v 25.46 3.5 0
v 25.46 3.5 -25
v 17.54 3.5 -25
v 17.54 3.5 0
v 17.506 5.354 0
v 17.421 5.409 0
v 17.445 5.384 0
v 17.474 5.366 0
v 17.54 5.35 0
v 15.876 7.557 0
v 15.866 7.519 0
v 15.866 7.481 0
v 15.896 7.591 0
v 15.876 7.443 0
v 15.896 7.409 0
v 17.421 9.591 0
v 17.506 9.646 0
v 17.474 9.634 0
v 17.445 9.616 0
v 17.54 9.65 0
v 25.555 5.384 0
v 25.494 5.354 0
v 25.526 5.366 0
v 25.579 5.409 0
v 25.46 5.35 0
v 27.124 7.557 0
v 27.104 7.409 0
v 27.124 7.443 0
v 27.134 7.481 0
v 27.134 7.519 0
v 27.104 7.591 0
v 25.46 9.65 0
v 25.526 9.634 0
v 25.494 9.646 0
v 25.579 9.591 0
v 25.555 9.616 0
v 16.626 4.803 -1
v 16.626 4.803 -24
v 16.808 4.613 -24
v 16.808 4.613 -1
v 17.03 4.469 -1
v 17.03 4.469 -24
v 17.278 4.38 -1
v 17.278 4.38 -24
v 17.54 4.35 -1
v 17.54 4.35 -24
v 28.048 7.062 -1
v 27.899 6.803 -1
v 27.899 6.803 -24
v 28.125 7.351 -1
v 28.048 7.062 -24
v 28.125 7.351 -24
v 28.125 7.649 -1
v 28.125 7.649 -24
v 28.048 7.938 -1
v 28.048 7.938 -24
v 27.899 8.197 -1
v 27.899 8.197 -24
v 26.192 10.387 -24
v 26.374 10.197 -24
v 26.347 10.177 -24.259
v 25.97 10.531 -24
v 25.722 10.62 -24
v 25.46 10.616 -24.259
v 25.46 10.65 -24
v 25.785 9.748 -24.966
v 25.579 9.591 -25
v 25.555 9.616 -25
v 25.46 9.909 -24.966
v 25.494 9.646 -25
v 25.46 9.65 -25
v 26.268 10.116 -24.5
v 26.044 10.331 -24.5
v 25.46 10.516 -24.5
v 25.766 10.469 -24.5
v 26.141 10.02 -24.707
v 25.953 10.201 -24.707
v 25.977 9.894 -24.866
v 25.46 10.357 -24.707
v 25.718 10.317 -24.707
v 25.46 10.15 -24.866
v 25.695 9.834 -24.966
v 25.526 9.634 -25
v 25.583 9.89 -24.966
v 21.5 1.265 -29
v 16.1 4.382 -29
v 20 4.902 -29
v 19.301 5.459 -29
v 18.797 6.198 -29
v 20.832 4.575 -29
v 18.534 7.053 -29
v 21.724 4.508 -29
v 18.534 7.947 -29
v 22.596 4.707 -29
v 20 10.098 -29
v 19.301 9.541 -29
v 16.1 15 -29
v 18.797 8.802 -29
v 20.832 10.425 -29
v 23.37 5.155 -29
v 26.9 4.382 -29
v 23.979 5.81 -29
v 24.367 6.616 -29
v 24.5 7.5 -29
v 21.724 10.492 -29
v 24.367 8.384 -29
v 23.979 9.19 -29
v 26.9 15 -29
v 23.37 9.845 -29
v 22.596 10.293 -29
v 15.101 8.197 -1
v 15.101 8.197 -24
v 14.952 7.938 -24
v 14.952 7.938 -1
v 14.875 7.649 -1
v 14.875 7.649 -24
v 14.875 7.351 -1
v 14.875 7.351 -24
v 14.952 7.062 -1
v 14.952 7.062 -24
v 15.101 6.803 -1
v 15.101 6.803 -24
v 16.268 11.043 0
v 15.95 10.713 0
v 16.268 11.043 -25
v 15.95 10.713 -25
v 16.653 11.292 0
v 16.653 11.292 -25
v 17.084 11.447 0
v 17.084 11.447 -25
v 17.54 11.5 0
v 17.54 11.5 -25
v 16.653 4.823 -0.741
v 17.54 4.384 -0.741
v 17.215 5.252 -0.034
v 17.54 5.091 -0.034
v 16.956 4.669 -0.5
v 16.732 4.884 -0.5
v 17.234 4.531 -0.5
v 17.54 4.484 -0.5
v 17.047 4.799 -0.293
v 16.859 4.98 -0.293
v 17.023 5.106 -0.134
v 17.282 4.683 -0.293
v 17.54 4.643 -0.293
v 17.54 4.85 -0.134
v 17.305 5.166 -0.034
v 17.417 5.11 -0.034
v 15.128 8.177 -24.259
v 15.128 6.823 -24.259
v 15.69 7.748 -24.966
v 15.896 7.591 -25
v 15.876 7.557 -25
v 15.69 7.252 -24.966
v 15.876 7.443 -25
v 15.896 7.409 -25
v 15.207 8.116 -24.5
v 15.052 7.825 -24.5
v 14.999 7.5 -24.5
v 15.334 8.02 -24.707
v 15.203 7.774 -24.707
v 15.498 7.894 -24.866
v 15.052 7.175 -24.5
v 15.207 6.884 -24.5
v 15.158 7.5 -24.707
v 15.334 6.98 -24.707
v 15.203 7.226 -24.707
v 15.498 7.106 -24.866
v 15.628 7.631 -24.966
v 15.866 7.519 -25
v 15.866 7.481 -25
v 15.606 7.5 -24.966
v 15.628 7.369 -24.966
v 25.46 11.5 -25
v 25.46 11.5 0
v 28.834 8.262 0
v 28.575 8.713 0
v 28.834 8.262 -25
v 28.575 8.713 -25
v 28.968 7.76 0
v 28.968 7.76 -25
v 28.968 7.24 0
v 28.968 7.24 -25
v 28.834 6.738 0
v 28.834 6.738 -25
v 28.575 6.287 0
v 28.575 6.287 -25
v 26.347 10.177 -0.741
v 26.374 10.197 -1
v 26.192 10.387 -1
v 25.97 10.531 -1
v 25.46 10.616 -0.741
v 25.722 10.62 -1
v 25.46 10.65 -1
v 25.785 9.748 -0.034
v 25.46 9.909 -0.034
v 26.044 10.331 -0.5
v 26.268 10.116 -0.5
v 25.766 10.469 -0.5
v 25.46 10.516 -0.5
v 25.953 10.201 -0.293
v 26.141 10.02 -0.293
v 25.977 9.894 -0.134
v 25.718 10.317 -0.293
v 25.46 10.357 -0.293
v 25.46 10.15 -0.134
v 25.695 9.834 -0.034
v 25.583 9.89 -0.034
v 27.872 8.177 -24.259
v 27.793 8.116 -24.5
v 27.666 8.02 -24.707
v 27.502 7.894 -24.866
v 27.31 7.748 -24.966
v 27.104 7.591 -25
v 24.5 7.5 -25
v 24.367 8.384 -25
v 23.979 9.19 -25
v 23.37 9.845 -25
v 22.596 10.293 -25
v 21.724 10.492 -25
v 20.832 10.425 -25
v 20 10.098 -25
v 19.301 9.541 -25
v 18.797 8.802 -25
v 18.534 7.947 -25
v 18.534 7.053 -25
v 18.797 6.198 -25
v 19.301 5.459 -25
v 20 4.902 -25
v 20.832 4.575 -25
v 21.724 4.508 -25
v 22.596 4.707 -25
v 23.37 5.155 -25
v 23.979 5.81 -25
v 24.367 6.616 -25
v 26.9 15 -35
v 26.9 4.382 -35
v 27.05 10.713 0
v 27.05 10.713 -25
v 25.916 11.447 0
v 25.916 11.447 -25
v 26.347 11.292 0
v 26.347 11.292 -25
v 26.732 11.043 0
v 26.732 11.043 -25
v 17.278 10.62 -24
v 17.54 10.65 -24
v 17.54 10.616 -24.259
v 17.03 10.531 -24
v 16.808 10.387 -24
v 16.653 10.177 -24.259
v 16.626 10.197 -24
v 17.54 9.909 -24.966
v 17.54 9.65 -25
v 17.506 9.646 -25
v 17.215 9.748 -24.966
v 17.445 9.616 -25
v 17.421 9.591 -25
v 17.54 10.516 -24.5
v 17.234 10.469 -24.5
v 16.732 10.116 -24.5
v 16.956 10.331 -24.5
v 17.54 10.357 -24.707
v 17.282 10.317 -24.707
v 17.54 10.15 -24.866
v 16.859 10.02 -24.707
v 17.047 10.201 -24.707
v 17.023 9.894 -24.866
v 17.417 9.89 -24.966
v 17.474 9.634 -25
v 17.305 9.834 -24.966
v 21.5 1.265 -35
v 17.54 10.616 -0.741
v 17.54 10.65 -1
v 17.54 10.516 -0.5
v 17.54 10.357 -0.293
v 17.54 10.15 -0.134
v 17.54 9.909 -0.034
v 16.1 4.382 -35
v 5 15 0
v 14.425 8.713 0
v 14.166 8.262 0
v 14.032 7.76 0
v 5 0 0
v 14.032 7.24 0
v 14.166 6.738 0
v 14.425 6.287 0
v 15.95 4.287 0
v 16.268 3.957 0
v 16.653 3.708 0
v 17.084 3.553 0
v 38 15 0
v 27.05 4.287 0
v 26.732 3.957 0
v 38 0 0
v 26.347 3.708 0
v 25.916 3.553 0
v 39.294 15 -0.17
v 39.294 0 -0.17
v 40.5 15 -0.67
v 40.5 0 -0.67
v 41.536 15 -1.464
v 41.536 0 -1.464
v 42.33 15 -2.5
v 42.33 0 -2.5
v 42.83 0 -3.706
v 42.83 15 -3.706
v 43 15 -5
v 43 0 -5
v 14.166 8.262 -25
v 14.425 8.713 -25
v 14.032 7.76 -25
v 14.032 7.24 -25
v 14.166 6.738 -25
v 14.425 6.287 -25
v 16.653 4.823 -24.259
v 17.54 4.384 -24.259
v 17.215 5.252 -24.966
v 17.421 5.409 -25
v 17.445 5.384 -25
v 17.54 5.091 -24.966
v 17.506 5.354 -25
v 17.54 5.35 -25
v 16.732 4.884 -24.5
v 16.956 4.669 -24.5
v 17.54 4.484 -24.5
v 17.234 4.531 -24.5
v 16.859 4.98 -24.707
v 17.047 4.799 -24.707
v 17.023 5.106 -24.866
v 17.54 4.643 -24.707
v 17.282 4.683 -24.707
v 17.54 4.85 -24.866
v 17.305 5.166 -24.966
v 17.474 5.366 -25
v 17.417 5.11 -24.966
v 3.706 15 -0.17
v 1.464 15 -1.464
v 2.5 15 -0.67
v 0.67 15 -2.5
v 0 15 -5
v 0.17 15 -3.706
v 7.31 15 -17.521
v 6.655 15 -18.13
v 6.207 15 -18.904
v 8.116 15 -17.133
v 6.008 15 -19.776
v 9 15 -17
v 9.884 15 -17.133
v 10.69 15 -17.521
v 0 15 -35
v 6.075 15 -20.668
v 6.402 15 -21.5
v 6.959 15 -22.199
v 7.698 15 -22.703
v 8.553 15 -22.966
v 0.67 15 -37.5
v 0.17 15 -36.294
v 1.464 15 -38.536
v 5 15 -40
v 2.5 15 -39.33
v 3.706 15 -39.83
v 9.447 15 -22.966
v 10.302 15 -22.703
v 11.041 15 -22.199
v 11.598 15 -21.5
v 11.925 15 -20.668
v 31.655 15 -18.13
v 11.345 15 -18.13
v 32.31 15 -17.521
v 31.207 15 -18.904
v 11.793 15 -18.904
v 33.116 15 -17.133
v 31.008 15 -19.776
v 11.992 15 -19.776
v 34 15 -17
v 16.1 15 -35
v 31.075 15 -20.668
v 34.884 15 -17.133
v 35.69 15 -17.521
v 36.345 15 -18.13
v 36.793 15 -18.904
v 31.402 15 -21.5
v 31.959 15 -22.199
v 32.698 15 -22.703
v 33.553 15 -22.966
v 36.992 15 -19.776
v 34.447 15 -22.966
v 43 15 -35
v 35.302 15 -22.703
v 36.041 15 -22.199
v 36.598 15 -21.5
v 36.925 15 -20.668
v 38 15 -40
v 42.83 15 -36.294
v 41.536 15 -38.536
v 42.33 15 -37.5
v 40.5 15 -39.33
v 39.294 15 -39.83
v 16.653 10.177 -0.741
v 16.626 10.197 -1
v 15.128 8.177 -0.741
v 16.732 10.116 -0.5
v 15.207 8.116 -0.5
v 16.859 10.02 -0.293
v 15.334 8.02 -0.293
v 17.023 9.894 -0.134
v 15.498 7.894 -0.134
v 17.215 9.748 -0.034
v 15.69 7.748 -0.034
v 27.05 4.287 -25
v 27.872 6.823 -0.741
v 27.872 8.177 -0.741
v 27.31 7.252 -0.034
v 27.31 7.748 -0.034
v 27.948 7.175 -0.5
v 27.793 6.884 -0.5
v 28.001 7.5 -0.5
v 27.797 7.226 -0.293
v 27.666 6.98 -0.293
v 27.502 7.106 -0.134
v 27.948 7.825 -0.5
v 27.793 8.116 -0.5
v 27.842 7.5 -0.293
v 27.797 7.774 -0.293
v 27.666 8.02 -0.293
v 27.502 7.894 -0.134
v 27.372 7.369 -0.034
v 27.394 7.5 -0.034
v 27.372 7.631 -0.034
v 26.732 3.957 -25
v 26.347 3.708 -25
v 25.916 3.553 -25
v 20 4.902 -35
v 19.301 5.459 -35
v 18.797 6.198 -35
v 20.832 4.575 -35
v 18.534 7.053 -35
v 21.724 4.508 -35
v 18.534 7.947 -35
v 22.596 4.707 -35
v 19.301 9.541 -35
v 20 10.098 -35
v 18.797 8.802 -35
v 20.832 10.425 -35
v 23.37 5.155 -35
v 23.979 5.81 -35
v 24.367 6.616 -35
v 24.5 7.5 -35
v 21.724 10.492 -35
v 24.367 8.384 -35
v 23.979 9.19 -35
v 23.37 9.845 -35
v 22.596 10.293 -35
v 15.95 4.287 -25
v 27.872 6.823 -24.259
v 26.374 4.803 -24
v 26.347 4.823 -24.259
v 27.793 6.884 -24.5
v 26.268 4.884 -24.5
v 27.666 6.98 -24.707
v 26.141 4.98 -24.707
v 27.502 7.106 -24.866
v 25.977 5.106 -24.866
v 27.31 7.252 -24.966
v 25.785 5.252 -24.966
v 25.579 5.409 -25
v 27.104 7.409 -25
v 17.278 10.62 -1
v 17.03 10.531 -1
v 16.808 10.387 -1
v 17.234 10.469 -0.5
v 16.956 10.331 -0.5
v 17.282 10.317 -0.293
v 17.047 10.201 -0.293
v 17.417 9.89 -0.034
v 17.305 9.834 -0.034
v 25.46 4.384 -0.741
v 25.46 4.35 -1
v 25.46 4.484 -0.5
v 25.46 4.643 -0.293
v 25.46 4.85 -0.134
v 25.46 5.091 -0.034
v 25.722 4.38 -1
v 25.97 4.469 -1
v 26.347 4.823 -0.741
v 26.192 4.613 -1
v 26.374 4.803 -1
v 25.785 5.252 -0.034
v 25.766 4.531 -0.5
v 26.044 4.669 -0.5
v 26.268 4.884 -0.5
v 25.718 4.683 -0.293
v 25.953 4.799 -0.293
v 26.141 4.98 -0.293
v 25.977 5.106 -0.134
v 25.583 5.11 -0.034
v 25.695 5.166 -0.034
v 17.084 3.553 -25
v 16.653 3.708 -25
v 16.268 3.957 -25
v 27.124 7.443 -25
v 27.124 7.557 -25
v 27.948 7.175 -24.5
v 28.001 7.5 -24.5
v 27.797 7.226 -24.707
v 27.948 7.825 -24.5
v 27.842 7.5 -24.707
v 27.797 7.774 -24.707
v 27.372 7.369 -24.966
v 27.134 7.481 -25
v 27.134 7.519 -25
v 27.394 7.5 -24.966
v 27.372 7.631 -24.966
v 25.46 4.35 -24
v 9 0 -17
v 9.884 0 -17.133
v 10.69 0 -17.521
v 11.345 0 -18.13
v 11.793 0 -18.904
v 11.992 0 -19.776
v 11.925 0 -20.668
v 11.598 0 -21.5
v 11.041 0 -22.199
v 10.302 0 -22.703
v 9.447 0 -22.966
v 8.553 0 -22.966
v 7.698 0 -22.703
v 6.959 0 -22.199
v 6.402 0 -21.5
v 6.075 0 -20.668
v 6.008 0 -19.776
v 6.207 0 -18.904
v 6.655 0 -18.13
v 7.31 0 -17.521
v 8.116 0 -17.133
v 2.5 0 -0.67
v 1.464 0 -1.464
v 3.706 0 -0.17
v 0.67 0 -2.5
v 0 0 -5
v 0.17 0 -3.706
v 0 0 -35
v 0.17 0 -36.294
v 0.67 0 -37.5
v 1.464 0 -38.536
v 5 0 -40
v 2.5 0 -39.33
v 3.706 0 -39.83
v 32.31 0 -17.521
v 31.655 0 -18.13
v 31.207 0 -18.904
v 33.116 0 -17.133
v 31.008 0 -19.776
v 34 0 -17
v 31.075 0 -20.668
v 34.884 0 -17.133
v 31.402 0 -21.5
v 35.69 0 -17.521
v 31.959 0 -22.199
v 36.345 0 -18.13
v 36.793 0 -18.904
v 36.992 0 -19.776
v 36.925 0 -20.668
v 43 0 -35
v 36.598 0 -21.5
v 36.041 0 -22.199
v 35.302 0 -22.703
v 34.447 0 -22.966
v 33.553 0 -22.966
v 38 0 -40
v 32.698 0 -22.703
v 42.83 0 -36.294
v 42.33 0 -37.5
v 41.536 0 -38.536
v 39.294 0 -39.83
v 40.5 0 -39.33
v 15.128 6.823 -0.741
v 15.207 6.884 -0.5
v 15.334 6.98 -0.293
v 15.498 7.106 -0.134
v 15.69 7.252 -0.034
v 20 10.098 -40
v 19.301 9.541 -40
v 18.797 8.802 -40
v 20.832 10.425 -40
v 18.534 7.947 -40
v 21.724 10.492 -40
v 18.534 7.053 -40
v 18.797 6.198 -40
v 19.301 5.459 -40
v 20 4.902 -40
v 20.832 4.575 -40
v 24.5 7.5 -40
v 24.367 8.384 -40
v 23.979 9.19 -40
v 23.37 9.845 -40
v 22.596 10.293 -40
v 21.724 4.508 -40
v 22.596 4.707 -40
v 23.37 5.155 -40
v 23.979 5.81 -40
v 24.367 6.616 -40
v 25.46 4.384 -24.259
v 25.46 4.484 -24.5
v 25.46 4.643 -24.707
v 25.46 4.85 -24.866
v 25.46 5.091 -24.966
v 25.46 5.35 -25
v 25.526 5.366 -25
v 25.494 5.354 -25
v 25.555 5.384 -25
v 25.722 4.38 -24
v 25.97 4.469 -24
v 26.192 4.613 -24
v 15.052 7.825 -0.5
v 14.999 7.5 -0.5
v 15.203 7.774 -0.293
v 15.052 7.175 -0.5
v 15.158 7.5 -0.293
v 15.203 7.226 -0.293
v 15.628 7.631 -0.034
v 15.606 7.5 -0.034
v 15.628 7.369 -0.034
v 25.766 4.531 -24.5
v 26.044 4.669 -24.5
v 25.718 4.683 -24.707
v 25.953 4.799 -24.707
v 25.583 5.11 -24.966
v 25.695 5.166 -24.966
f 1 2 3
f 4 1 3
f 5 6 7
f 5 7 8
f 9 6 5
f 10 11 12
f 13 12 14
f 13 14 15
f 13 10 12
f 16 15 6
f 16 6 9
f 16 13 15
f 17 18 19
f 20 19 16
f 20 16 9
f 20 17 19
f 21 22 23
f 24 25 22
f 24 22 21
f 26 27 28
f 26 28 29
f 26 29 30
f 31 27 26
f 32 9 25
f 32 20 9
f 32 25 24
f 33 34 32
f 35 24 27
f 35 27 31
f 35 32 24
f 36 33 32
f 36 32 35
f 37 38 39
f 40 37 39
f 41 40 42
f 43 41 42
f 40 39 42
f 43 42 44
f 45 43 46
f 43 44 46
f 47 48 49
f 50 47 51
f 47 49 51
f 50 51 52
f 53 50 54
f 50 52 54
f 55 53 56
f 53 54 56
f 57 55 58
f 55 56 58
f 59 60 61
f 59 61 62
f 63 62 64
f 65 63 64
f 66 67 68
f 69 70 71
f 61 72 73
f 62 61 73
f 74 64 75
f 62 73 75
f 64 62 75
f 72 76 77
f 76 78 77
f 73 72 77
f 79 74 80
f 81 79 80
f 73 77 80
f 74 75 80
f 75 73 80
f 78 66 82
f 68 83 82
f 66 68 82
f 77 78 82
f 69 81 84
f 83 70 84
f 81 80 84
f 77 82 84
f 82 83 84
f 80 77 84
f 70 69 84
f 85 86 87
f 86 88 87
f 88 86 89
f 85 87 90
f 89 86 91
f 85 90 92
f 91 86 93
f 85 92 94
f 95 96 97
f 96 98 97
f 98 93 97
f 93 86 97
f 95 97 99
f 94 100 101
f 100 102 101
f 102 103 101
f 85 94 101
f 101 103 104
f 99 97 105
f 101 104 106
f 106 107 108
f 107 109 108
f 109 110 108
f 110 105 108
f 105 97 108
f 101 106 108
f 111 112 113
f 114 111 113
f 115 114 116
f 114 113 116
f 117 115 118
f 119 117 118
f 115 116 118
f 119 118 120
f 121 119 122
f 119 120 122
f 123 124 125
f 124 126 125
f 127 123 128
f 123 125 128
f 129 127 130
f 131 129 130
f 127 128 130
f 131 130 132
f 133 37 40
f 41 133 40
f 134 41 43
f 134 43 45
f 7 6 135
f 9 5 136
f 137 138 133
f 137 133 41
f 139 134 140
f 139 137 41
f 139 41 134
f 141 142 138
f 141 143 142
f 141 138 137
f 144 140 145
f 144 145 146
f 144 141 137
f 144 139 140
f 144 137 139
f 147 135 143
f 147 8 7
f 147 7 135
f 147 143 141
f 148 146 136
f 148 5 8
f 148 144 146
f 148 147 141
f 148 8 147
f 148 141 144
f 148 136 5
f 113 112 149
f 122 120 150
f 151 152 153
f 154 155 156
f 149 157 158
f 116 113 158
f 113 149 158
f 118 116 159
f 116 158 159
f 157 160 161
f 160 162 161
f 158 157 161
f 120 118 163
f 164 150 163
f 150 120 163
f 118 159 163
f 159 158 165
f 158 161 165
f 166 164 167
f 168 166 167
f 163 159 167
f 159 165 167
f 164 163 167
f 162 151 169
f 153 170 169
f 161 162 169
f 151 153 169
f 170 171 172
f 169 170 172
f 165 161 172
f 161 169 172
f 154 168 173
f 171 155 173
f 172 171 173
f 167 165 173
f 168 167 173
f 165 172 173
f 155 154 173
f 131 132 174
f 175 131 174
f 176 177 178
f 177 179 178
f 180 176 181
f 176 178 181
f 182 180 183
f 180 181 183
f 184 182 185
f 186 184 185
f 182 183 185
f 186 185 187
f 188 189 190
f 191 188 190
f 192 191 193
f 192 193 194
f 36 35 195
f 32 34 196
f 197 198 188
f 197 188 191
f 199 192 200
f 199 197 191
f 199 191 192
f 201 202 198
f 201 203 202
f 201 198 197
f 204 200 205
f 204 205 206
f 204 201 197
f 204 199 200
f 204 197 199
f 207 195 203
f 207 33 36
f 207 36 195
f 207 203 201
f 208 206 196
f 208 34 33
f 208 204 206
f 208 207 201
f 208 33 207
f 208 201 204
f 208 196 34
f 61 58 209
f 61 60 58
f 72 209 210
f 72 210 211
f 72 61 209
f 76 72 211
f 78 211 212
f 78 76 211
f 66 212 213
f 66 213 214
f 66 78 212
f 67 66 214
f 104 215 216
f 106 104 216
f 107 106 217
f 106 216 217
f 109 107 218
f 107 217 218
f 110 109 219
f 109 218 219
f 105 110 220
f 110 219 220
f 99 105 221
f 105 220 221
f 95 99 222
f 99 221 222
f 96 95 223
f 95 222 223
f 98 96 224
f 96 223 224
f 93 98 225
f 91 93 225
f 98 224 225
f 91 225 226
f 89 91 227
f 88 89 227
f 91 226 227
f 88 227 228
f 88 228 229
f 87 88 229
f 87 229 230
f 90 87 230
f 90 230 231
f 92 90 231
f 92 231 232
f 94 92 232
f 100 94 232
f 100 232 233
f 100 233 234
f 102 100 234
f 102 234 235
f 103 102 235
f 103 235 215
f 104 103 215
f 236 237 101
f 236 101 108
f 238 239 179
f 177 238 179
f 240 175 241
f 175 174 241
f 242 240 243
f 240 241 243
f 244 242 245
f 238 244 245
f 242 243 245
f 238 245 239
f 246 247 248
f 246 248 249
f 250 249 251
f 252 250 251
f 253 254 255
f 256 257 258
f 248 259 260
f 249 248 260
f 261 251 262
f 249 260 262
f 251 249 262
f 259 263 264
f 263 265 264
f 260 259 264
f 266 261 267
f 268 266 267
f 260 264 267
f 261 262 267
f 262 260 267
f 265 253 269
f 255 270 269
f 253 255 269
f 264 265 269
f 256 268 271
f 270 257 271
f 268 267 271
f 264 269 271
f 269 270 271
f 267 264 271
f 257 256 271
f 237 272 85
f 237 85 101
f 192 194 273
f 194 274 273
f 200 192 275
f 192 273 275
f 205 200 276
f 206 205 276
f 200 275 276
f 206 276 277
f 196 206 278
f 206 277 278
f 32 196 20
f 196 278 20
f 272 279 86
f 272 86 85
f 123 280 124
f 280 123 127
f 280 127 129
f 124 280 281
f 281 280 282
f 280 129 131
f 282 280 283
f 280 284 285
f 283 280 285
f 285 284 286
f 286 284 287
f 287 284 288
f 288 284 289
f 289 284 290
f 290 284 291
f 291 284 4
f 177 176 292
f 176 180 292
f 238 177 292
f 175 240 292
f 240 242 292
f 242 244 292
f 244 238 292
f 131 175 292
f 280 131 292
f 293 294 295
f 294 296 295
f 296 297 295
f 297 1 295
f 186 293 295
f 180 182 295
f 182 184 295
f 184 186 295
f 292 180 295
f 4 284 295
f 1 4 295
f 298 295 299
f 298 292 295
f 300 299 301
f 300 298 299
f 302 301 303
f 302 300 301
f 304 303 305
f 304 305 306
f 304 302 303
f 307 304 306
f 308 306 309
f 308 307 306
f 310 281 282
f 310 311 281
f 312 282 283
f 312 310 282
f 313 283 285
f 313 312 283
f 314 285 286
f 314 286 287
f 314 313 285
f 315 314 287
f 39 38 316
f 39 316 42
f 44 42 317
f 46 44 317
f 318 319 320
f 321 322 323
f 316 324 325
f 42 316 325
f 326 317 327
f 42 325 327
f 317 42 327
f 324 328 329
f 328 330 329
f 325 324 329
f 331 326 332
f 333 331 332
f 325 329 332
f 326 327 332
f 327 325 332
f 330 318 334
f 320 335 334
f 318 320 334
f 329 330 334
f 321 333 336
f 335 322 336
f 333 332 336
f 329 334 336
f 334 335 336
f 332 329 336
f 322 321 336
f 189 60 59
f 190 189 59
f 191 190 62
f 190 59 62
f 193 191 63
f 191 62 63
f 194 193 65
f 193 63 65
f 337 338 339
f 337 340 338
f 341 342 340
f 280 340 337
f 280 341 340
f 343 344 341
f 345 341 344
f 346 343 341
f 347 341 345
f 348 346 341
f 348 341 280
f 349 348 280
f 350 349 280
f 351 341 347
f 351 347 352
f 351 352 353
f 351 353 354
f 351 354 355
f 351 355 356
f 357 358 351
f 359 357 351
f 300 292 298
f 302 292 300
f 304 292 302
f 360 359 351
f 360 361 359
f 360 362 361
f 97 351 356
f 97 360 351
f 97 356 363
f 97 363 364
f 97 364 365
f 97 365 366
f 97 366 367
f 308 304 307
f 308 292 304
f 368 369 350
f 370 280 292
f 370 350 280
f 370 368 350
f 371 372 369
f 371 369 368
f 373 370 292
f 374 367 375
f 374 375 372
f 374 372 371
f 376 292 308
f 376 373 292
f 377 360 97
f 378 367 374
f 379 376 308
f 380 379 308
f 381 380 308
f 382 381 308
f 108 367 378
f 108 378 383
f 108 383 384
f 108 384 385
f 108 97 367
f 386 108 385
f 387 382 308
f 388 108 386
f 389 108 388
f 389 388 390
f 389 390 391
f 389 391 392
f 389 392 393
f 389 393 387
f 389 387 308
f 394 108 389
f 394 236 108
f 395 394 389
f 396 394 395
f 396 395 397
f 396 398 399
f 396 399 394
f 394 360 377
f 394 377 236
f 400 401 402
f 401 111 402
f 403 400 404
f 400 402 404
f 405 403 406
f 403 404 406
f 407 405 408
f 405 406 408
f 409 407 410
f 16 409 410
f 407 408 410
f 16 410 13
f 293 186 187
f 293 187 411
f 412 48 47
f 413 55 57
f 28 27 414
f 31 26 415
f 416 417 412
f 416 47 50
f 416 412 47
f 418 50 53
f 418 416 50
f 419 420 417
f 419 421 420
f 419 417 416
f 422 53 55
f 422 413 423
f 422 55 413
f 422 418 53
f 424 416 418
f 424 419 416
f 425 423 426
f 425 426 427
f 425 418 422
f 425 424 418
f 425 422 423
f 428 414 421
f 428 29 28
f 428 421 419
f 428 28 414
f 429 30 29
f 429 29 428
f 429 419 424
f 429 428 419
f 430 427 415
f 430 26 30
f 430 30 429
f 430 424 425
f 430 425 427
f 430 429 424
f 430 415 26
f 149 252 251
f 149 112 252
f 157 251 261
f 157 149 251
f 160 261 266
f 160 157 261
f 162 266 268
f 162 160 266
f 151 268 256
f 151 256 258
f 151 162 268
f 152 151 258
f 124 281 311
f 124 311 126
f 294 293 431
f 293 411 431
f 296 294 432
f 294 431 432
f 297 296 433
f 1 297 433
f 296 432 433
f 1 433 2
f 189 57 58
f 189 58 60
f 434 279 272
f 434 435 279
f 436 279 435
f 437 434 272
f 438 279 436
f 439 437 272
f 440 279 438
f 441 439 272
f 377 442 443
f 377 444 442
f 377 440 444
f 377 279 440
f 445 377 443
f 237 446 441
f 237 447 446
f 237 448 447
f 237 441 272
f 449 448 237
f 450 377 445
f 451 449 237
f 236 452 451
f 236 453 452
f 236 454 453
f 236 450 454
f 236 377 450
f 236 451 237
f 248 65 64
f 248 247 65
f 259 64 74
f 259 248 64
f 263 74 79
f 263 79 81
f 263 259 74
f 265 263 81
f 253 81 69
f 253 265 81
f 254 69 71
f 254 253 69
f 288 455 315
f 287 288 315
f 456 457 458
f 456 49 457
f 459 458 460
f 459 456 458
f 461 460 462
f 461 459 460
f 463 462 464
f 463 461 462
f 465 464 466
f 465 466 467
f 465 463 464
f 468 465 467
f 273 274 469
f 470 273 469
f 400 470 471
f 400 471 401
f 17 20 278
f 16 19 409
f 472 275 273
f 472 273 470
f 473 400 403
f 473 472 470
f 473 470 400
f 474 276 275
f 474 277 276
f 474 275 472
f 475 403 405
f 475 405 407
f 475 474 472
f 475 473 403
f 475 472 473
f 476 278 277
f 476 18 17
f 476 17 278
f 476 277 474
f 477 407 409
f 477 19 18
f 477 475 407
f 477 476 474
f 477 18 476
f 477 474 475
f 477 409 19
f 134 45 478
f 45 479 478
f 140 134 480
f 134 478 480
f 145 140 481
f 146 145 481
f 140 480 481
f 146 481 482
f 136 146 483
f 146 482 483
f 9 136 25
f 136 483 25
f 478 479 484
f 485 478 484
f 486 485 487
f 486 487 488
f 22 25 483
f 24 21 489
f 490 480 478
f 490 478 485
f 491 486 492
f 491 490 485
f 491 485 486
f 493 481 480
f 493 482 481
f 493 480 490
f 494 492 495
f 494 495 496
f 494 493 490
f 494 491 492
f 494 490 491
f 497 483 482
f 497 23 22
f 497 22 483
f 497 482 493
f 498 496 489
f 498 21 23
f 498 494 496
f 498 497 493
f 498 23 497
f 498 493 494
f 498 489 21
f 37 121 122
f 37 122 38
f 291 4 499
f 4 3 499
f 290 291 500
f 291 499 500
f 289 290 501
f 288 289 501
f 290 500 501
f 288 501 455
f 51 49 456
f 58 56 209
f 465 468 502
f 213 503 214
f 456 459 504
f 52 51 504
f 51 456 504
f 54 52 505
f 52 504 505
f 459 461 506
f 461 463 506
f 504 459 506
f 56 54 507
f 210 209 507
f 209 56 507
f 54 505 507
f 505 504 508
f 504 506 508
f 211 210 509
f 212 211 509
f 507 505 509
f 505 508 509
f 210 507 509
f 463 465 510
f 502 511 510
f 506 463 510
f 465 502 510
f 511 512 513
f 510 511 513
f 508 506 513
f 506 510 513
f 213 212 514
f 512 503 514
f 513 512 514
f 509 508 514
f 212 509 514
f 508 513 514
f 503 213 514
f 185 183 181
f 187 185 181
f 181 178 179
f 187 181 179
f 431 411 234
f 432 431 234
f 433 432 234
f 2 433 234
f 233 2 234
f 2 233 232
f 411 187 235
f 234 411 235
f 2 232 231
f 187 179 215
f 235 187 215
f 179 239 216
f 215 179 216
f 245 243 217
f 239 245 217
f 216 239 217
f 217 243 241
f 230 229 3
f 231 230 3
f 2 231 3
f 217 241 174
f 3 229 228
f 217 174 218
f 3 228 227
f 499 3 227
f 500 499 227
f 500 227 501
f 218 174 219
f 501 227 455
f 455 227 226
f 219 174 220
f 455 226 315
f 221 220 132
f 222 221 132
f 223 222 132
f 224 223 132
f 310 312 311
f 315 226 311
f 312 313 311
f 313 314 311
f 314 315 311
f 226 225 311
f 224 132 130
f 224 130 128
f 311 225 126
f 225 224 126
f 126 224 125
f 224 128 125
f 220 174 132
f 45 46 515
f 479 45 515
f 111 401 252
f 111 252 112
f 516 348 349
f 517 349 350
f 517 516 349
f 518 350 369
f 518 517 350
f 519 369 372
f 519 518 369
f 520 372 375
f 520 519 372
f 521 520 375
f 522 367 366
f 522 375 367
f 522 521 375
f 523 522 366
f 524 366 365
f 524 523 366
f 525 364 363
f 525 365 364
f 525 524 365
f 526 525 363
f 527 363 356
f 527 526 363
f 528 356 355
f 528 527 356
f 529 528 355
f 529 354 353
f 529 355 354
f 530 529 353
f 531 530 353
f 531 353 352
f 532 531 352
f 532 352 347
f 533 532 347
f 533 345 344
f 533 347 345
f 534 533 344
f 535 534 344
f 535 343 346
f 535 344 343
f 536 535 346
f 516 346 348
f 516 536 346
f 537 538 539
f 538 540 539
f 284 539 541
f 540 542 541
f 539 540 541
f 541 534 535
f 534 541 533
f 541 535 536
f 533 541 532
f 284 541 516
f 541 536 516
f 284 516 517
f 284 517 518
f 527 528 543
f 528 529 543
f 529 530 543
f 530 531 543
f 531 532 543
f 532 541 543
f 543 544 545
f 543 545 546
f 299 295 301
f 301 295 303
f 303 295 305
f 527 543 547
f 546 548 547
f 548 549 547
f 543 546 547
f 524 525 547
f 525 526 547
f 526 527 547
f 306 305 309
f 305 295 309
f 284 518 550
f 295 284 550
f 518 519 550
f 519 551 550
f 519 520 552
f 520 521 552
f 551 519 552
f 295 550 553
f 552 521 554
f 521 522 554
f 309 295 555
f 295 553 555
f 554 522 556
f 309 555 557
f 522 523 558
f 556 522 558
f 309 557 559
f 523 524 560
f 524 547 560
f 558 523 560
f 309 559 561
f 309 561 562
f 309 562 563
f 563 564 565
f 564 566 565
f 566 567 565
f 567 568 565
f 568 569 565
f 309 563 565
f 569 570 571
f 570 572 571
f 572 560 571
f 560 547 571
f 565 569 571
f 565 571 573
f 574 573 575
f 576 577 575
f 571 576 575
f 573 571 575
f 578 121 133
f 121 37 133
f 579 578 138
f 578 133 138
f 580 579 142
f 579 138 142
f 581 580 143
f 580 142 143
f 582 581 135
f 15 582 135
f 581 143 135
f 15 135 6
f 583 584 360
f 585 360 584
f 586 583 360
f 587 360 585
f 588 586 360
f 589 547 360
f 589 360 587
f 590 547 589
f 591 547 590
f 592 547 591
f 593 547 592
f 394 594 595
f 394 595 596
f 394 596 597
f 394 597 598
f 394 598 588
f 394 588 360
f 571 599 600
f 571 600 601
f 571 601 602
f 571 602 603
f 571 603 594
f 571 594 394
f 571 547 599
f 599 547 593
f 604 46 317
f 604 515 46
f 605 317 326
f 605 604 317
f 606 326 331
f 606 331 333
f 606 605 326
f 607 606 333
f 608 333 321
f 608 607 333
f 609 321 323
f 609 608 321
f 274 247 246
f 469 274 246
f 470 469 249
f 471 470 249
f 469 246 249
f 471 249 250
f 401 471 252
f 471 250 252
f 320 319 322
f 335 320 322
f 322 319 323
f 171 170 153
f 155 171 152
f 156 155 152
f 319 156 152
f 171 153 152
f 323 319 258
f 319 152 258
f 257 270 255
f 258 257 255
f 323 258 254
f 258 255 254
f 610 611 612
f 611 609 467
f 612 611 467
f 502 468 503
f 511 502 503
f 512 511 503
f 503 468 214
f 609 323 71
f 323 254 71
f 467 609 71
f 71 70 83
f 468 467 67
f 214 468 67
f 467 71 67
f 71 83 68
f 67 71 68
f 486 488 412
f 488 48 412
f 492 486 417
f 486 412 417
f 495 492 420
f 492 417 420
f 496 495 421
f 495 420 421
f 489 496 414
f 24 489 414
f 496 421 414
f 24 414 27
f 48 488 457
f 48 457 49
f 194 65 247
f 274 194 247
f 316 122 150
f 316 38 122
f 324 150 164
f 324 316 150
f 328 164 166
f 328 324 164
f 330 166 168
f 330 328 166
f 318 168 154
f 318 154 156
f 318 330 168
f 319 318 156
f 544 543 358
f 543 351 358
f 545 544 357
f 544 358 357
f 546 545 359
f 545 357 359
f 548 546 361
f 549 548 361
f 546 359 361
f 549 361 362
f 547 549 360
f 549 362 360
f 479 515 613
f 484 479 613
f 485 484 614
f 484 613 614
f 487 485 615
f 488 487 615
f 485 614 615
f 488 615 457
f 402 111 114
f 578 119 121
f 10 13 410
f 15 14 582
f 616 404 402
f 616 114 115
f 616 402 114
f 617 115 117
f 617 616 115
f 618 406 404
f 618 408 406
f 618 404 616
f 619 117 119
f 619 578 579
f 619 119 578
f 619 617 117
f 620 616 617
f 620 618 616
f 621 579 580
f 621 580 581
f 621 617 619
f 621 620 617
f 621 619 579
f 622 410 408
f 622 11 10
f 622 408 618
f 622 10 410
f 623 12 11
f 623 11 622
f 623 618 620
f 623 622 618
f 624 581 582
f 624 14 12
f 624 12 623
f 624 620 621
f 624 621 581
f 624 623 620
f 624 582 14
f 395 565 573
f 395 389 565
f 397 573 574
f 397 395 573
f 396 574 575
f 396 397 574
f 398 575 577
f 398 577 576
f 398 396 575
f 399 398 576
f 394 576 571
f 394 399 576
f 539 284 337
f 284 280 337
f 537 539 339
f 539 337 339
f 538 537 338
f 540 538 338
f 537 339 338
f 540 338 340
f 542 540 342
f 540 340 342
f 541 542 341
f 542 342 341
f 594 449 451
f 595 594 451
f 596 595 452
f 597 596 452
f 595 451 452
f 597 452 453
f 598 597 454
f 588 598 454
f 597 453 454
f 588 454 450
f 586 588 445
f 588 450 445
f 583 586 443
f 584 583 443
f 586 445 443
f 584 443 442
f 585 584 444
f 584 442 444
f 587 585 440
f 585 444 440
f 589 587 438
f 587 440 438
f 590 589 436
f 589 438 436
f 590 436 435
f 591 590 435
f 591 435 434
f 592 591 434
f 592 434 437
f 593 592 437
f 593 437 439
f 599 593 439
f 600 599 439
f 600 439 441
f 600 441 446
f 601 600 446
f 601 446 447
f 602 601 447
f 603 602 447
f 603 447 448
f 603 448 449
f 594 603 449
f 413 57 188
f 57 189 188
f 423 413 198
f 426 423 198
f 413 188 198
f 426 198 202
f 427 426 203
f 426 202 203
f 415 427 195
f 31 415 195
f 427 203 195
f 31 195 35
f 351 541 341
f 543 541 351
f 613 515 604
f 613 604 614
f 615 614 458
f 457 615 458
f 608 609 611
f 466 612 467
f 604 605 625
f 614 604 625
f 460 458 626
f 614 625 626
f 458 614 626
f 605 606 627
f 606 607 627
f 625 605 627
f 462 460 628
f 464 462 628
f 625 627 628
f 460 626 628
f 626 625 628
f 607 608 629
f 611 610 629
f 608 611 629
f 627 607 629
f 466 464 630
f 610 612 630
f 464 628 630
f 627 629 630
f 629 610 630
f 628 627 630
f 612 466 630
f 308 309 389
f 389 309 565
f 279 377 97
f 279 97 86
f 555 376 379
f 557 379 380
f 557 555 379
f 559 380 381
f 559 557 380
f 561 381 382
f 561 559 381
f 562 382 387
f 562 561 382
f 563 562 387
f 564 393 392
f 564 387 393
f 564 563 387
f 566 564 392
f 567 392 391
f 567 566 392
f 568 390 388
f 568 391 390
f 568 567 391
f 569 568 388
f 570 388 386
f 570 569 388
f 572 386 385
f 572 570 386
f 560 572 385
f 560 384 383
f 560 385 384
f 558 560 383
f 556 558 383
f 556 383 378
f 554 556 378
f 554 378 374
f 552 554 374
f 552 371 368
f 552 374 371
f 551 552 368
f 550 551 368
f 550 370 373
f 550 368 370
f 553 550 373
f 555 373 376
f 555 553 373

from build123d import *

# Parameters (mm, degrees)
SKETCH1_W           = 43
SKETCH1_H           = 40
BOSS_EXTRUDE1_DEPTH = 15
CUT_EXTRUDE1_DEPTH  = 25
SKETCH3_R           = 3
CUT_EXTRUDE2_DEPTH  = 61.613529843
SKETCH4_R           = 3
CUT_EXTRUDE3_DEPTH  = 61.613529843
FILLET1_R           = 2
FILLET3_R           = 5
SURFACE_KNIT1_START = -25
SURFACE_KNIT1_DEPTH = 25
FILLET2_R           = 1
CUT_EXTRUDE4_START  = 5
CUT_EXTRUDE4_DEPTH  = 6


# Read off the part's stored shape, not the designer's step: Surface-Knit1
with BuildPart() as part:
    # Sketch1 → Boss-Extrude1 (new body)
    with BuildSketch(Plane(origin=(0, 0, 0), x_dir=(1, 0, 0), z_dir=(0, 1, 0))):
        with Locations((21.5, 20)):
            Rectangle(SKETCH1_W, SKETCH1_H)
    extrude(amount=BOSS_EXTRUDE1_DEPTH)

    # Sketch2 → Cut-Extrude1 (cut)
    with BuildSketch(Plane.XY):
        Polygon((13.5, 7.5), (16.55, 11.5), (26.45, 11.5), (29.5, 7.5), (26.45, 3.5), (16.55, 3.5), align=None)
    extrude(amount=-CUT_EXTRUDE1_DEPTH, mode=Mode.SUBTRACT)

    # Sketch3 → Cut-Extrude2 (cut, through all)
    with BuildSketch(Plane.XY):
        with Locations((21.5, 7.5)):
            Circle(SKETCH3_R)
    extrude(amount=-CUT_EXTRUDE2_DEPTH, mode=Mode.SUBTRACT)

    # Sketch4 → Cut-Extrude3 (cut, through all)
    with BuildSketch(Plane(origin=(0, 0, 0), x_dir=(1, 0, 0), z_dir=(0, 1, 0))):
        with Locations(Location((9, 20, 0), (0, 0, 270))):
            Circle(SKETCH4_R)
        with Locations(Location((34, 20, 0), (0, 0, 270))):
            Circle(SKETCH4_R)
    extrude(amount=CUT_EXTRUDE3_DEPTH, mode=Mode.SUBTRACT)

    # Fillet1
    fillet1_edges = [part.edges().sort_by_distance(p)[0] for p in [
        (16.55, 3.5, -12.5),
        (13.5, 7.5, -12.5),
        (16.55, 11.5, -12.5),
        (26.45, 11.5, -12.5),
        (29.5, 7.5, -12.5),
        (26.45, 3.5, -12.5),
    ]]
    fillet(fillet1_edges, radius=FILLET1_R)

    # Fillet3
    fillet3_edges = [part.edges().sort_by_distance(p)[0] for p in [
        (0, 7.5, -40),
        (43, 7.5, -40),
        (43, 7.5, 0),
        (0, 7.5, 0),
    ]]
    fillet(fillet3_edges, radius=FILLET3_R)

    # Sketch6 → Cut-Extrude4 (cut)
    with BuildSketch(Plane.XY.offset(-40).offset(CUT_EXTRUDE4_START)):
        Polygon((26.9, 10.617691454), (26.9, 15), (16.1, 15), (16.1, 10.617691454), (16.1, 4.382308546), (21.5, 1.264617093), (26.9, 4.382308546), align=None)
    extrude(amount=CUT_EXTRUDE4_DEPTH, mode=Mode.SUBTRACT)


with BuildPart() as body_2:
    # Surface-Knit1 outline → Surface-Knit1 (new body)
    with BuildSketch(Plane.XY.offset(SURFACE_KNIT1_START)):
        with BuildLine():
            ThreePointArc((16.625595514, 4.802705944), (17.029877681, 4.469371996), (17.540079522, 4.35))
            Line((17.540079522, 4.35), (25.459920478, 4.35))
            ThreePointArc((25.459920478, 4.35), (25.970122319, 4.469371996), (26.374404486, 4.802705944))
            Line((26.374404486, 4.802705944), (27.899404486, 6.802705944))
            ThreePointArc((27.899404486, 6.802705944), (28.134920478, 7.5), (27.899404486, 8.197294056))
            Line((27.899404486, 8.197294056), (26.374404486, 10.197294056))
            ThreePointArc((26.374404486, 10.197294056), (25.970122319, 10.530628004), (25.459920478, 10.65))
            Line((25.459920478, 10.65), (17.540079522, 10.65))
            ThreePointArc((17.540079522, 10.65), (17.029877681, 10.530628004), (16.625595514, 10.197294056))
            Line((16.625595514, 10.197294056), (15.100595514, 8.197294056))
            ThreePointArc((15.100595514, 8.197294056), (14.865079522, 7.5), (15.100595514, 6.802705944))
            Line((15.100595514, 6.802705944), (16.625595514, 4.802705944))
        make_face()
    extrude(amount=SURFACE_KNIT1_DEPTH)

    # Fillet2
    fillet2_edges = [body_2.edges().sort_by_distance(p)[0] for p in [
        (14.865079522, 7.5, 0),
        (15.863095514, 9.197294056, -25),
        (15.863095514, 9.197294056, 0),
        (21.5, 10.65, -25),
        (21.5, 10.65, 0),
        (17.029877681, 10.530628004, -25),
        (17.029877681, 10.530628004, 0),
        (25.970122319, 10.530628004, -25),
        (25.970122319, 10.530628004, 0),
        (27.136904486, 9.197294056, -25),
        (27.136904486, 9.197294056, 0),
        (28.134920478, 7.5, -25),
        (28.134920478, 7.5, 0),
        (25.970122319, 4.469371996, -25),
        (25.970122319, 4.469371996, 0),
        (27.136904486, 5.802705944, -25),
        (27.136904486, 5.802705944, 0),
        (21.5, 4.35, -25),
        (21.5, 4.35, 0),
        (17.029877681, 4.469371996, -25),
        (17.029877681, 4.469371996, 0),
        (15.863095514, 5.802705944, 0),
        (15.863095514, 5.802705944, -25),
        (14.865079522, 7.5, -25),
    ]]
    fillet(fillet2_edges, radius=FILLET2_R)


solid = Compound([part.part, body_2.part])
